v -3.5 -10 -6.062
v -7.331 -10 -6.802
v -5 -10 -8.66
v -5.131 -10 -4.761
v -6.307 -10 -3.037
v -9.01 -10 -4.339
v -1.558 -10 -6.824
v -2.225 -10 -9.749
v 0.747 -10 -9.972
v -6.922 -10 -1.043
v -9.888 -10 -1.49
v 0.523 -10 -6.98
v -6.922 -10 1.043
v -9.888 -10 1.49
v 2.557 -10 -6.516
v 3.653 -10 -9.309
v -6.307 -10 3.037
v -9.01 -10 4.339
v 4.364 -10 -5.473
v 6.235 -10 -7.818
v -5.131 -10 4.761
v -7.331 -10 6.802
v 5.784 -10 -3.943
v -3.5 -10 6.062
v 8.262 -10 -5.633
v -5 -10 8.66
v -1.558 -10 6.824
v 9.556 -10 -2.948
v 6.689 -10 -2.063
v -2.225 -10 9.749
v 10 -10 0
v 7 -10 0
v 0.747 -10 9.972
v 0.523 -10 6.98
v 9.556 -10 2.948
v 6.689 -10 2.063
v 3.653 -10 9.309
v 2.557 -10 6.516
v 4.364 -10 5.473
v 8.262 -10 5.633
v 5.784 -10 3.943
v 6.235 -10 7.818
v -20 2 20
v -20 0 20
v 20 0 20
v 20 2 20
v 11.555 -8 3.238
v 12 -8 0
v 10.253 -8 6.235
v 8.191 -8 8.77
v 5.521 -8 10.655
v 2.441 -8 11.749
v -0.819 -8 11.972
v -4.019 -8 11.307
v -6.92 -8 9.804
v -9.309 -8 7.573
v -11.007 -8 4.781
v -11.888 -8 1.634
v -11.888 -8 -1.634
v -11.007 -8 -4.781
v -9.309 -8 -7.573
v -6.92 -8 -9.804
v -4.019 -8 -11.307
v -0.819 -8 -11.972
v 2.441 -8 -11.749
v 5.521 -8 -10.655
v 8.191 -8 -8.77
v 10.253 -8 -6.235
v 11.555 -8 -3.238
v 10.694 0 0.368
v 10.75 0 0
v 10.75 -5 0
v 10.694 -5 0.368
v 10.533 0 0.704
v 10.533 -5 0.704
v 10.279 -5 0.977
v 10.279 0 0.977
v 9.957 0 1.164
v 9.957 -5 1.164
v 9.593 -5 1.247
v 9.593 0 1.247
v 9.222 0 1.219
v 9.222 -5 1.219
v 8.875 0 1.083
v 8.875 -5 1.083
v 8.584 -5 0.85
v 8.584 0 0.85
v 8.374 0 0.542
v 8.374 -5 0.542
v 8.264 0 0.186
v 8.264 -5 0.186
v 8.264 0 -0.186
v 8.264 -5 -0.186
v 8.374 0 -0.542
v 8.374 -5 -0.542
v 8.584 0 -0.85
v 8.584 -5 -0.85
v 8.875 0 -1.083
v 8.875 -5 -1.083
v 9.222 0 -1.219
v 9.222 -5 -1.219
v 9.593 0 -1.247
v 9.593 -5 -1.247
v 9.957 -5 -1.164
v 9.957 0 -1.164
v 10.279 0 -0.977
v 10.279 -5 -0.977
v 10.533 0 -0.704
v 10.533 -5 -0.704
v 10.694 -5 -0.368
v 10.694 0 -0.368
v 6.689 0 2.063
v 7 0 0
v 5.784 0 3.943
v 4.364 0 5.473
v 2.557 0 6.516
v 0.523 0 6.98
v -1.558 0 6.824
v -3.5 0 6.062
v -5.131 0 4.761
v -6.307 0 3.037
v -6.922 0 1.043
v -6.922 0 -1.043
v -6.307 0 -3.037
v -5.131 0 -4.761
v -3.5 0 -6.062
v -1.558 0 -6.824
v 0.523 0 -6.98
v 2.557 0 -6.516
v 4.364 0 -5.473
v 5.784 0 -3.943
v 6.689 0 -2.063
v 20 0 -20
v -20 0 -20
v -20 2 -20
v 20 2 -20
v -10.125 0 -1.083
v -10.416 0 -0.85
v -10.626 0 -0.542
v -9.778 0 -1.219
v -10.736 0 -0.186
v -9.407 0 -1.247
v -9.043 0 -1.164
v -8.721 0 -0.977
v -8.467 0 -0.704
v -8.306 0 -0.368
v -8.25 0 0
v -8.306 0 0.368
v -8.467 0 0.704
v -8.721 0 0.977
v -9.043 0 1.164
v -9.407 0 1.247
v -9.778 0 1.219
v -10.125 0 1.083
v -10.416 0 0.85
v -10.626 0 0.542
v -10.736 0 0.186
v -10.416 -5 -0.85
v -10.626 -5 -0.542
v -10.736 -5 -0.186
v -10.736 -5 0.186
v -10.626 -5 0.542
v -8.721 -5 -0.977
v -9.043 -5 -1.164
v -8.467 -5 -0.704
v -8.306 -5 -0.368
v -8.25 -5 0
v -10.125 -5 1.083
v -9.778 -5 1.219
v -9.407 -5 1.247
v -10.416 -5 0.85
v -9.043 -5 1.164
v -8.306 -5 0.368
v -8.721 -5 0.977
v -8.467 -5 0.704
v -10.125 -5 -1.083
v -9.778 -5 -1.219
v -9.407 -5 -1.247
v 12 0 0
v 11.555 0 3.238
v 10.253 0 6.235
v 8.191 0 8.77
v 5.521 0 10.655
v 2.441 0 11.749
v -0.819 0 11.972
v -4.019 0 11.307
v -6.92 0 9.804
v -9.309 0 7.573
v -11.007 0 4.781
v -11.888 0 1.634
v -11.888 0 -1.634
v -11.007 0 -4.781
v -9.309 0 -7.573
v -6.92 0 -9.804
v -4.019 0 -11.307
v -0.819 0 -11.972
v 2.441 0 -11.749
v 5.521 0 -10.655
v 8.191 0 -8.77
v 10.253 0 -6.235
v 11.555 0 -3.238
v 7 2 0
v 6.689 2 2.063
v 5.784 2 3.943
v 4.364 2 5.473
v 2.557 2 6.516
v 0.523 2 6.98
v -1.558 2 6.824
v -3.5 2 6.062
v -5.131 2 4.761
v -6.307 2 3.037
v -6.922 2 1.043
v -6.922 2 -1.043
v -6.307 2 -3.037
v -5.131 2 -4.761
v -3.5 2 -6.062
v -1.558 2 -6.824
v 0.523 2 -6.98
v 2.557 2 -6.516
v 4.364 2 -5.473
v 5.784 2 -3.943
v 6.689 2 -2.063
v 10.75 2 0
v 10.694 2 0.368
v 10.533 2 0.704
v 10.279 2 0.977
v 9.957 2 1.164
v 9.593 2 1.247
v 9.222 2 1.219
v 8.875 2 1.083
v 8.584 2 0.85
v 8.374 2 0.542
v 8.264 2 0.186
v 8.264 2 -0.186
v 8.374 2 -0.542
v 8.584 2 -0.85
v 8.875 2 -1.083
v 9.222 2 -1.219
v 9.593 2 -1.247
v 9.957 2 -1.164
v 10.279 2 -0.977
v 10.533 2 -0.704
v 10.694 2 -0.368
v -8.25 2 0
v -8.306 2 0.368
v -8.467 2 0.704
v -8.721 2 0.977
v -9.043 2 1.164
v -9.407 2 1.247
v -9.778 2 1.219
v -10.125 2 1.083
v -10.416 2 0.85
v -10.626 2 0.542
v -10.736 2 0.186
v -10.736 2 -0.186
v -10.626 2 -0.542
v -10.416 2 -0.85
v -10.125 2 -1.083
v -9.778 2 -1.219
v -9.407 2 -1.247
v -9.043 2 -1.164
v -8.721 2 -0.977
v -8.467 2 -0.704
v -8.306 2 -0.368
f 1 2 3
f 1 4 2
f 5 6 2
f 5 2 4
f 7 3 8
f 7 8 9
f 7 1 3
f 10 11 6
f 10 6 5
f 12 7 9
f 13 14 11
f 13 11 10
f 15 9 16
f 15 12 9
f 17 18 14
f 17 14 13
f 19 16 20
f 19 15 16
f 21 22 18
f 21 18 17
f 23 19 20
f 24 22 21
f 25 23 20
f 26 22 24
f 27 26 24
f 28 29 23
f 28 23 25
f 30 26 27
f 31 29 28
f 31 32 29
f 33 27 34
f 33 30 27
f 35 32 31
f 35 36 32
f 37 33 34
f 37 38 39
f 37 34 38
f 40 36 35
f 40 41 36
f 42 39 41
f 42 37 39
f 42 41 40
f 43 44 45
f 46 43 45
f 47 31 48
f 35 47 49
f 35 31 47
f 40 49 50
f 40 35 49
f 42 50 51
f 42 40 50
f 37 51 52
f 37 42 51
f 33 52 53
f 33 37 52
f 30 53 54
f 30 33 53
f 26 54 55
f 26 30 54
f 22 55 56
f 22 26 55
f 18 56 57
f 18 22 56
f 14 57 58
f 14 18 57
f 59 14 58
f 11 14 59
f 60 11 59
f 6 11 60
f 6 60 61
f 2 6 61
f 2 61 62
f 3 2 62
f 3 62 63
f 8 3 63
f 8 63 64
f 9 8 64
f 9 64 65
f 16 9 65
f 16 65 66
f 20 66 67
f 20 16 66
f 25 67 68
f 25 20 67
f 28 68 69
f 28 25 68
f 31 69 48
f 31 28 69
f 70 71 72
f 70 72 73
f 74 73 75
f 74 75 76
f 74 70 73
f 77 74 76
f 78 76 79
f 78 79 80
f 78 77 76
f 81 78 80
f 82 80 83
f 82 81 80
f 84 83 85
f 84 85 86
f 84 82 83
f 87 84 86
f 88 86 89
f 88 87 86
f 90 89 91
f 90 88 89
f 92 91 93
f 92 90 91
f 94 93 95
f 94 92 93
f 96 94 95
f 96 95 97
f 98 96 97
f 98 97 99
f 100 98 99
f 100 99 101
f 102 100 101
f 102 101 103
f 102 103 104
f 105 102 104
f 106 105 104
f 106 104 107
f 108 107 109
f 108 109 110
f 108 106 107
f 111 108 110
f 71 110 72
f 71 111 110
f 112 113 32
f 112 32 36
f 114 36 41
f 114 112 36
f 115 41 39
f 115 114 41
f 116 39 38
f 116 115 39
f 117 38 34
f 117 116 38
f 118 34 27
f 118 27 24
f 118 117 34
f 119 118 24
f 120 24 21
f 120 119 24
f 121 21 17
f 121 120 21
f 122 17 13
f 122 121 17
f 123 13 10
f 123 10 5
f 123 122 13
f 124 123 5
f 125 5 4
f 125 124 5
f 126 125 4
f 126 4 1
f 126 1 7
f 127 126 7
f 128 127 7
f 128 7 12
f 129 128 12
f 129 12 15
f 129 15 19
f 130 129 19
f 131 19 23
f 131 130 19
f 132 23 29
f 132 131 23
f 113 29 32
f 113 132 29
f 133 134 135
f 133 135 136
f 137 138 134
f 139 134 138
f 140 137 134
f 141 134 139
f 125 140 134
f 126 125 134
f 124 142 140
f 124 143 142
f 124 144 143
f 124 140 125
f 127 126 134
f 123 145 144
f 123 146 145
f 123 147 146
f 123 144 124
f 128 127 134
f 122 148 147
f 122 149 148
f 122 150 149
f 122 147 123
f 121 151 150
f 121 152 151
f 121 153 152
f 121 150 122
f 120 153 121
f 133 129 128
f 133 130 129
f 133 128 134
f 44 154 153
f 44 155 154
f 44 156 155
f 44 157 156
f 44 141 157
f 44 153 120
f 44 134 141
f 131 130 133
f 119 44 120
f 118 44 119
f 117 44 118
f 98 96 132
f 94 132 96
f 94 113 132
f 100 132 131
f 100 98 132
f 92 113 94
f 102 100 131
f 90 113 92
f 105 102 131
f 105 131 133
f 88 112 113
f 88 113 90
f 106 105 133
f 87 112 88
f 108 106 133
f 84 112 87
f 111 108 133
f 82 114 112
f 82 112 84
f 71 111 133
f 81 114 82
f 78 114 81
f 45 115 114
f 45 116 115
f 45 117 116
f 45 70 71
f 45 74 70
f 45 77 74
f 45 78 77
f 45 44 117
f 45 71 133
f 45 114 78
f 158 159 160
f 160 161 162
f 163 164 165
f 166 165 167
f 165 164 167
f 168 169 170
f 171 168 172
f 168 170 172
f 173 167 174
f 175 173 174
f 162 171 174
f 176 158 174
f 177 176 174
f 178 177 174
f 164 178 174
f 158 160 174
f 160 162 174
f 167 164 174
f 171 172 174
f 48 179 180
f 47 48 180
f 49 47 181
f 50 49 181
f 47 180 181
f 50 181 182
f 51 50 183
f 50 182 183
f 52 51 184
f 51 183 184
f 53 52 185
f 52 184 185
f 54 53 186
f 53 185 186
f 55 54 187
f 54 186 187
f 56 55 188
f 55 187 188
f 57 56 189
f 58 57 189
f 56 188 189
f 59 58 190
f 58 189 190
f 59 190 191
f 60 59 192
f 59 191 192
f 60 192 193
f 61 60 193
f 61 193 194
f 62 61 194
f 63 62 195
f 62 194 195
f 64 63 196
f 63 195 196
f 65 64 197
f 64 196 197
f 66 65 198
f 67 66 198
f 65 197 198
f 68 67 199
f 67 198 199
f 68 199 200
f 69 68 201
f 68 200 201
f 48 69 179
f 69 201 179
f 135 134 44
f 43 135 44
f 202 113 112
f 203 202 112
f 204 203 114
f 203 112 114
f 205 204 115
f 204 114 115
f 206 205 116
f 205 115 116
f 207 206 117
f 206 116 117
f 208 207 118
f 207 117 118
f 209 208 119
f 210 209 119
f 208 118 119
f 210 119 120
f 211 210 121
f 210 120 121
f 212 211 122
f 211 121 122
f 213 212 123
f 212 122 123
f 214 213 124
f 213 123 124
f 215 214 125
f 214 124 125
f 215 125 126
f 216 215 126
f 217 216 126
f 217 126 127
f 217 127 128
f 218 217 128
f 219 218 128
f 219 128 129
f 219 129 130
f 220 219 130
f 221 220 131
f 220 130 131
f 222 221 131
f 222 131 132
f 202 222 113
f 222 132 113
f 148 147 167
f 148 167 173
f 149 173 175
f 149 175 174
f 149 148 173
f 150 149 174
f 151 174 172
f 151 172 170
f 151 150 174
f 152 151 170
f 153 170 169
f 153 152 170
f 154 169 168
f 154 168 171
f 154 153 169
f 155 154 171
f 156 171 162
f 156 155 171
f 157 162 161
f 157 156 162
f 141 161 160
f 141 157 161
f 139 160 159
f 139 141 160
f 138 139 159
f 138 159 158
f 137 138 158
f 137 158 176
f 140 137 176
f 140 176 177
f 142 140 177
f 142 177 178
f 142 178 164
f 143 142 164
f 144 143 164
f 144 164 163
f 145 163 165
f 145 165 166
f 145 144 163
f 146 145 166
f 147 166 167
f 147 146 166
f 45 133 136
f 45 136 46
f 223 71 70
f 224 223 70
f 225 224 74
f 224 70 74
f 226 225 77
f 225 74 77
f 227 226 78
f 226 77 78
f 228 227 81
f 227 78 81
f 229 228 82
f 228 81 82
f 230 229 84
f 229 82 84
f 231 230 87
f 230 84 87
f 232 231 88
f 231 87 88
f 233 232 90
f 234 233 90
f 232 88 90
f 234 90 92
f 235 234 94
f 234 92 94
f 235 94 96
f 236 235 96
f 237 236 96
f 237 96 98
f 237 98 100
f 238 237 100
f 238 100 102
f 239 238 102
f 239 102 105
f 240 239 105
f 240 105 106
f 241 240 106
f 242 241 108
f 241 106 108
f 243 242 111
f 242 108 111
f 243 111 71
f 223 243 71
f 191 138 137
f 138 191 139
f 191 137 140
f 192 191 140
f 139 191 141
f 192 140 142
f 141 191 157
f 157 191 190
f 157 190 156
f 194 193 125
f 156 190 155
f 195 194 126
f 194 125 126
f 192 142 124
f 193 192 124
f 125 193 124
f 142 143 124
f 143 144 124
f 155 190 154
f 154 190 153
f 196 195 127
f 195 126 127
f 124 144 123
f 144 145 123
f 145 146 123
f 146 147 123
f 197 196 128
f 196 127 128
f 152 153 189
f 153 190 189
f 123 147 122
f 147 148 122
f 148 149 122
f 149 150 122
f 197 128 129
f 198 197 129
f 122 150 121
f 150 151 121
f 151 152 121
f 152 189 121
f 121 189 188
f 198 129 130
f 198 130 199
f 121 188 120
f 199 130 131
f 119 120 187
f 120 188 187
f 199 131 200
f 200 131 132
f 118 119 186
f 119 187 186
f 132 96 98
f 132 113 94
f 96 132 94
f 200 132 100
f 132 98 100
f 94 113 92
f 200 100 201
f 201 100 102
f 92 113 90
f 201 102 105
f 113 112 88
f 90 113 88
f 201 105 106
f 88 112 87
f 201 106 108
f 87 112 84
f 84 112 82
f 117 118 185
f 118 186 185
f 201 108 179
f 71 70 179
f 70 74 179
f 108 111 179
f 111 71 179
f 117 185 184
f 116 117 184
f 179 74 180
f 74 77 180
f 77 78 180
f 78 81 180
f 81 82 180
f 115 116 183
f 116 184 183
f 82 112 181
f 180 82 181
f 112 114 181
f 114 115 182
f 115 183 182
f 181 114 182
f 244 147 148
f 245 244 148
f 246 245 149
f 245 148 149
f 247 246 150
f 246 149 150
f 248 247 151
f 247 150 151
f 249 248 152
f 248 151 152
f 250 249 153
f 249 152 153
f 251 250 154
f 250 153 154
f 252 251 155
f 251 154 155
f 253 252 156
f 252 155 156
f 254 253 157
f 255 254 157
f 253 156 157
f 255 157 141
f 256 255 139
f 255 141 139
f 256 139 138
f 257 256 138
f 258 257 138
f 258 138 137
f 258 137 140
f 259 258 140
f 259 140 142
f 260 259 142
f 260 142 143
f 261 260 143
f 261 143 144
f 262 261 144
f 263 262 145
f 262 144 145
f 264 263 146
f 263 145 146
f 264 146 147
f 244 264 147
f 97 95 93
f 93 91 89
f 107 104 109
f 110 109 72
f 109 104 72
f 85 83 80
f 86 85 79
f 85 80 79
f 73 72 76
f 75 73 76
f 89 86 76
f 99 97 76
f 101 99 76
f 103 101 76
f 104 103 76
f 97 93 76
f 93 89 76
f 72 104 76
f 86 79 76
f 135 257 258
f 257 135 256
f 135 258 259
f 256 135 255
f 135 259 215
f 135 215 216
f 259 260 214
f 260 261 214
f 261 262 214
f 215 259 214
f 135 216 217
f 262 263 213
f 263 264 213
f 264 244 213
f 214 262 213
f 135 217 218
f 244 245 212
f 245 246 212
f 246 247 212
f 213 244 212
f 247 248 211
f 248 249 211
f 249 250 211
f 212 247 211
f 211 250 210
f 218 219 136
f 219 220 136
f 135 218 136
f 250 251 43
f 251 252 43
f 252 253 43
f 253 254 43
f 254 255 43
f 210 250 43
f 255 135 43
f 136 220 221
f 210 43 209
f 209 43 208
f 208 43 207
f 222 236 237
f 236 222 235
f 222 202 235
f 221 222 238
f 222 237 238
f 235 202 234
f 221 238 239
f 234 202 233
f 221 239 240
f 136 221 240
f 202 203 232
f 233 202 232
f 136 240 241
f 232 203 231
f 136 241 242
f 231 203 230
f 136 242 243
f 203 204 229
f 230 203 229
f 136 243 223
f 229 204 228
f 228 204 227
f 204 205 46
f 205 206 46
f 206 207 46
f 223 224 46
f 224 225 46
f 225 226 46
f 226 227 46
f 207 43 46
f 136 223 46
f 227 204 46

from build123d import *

# Parameters (mm, degrees)
F0_W     = 40
F0_H     = 40
F0_R     = 12
F0_R_2   = 1.25
F0_R_3   = 7
F1_DEPTH = 2
F2_DEPTH = 10
F3_SIZE  = 2
F4_DEPTH = 5


with BuildPart() as f1:
    # F0 (on Front) → F1 (new body)
    with BuildSketch(Plane.XZ):
        Rectangle(F0_W, F0_H)
        Circle(F0_R, mode=Mode.SUBTRACT)
        Circle(F0_R)
        with Locations((-9.5, 0)):
            Circle(F0_R_2, mode=Mode.SUBTRACT)
        Circle(F0_R_3, mode=Mode.SUBTRACT)
        with Locations((9.5, 0)):
            Circle(F0_R_2, mode=Mode.SUBTRACT)
    extrude(amount=-F1_DEPTH)


with BuildPart() as f2:
    # F0 (on Front) → F2 (new body)
    with BuildSketch(Plane.XZ):
        Circle(F0_R)
        with Locations((-9.5, 0)):
            Circle(F0_R_2, mode=Mode.SUBTRACT)
        Circle(F0_R_3, mode=Mode.SUBTRACT)
        with Locations((9.5, 0)):
            Circle(F0_R_2, mode=Mode.SUBTRACT)
        with Locations((-9.5, 0)):
            Circle(F0_R_2)
        with Locations((9.5, 0)):
            Circle(F0_R_2)
    extrude(amount=F2_DEPTH)

    # F3
    f3_edges = [f2.edges().sort_by_distance(p)[0] for p in [
        (-12, -10, 0),
    ]]
    chamfer(f3_edges, length=F3_SIZE)

    # F0 (on Front) → F4 (cut)
    with BuildSketch(Plane.XZ):
        with Locations((-9.5, 0)):
            Circle(F0_R_2)
        with Locations((9.5, 0)):
            Circle(F0_R_2)
    extrude(amount=F4_DEPTH, mode=Mode.SUBTRACT)


solid = Compound([f1.part, f2.part])
